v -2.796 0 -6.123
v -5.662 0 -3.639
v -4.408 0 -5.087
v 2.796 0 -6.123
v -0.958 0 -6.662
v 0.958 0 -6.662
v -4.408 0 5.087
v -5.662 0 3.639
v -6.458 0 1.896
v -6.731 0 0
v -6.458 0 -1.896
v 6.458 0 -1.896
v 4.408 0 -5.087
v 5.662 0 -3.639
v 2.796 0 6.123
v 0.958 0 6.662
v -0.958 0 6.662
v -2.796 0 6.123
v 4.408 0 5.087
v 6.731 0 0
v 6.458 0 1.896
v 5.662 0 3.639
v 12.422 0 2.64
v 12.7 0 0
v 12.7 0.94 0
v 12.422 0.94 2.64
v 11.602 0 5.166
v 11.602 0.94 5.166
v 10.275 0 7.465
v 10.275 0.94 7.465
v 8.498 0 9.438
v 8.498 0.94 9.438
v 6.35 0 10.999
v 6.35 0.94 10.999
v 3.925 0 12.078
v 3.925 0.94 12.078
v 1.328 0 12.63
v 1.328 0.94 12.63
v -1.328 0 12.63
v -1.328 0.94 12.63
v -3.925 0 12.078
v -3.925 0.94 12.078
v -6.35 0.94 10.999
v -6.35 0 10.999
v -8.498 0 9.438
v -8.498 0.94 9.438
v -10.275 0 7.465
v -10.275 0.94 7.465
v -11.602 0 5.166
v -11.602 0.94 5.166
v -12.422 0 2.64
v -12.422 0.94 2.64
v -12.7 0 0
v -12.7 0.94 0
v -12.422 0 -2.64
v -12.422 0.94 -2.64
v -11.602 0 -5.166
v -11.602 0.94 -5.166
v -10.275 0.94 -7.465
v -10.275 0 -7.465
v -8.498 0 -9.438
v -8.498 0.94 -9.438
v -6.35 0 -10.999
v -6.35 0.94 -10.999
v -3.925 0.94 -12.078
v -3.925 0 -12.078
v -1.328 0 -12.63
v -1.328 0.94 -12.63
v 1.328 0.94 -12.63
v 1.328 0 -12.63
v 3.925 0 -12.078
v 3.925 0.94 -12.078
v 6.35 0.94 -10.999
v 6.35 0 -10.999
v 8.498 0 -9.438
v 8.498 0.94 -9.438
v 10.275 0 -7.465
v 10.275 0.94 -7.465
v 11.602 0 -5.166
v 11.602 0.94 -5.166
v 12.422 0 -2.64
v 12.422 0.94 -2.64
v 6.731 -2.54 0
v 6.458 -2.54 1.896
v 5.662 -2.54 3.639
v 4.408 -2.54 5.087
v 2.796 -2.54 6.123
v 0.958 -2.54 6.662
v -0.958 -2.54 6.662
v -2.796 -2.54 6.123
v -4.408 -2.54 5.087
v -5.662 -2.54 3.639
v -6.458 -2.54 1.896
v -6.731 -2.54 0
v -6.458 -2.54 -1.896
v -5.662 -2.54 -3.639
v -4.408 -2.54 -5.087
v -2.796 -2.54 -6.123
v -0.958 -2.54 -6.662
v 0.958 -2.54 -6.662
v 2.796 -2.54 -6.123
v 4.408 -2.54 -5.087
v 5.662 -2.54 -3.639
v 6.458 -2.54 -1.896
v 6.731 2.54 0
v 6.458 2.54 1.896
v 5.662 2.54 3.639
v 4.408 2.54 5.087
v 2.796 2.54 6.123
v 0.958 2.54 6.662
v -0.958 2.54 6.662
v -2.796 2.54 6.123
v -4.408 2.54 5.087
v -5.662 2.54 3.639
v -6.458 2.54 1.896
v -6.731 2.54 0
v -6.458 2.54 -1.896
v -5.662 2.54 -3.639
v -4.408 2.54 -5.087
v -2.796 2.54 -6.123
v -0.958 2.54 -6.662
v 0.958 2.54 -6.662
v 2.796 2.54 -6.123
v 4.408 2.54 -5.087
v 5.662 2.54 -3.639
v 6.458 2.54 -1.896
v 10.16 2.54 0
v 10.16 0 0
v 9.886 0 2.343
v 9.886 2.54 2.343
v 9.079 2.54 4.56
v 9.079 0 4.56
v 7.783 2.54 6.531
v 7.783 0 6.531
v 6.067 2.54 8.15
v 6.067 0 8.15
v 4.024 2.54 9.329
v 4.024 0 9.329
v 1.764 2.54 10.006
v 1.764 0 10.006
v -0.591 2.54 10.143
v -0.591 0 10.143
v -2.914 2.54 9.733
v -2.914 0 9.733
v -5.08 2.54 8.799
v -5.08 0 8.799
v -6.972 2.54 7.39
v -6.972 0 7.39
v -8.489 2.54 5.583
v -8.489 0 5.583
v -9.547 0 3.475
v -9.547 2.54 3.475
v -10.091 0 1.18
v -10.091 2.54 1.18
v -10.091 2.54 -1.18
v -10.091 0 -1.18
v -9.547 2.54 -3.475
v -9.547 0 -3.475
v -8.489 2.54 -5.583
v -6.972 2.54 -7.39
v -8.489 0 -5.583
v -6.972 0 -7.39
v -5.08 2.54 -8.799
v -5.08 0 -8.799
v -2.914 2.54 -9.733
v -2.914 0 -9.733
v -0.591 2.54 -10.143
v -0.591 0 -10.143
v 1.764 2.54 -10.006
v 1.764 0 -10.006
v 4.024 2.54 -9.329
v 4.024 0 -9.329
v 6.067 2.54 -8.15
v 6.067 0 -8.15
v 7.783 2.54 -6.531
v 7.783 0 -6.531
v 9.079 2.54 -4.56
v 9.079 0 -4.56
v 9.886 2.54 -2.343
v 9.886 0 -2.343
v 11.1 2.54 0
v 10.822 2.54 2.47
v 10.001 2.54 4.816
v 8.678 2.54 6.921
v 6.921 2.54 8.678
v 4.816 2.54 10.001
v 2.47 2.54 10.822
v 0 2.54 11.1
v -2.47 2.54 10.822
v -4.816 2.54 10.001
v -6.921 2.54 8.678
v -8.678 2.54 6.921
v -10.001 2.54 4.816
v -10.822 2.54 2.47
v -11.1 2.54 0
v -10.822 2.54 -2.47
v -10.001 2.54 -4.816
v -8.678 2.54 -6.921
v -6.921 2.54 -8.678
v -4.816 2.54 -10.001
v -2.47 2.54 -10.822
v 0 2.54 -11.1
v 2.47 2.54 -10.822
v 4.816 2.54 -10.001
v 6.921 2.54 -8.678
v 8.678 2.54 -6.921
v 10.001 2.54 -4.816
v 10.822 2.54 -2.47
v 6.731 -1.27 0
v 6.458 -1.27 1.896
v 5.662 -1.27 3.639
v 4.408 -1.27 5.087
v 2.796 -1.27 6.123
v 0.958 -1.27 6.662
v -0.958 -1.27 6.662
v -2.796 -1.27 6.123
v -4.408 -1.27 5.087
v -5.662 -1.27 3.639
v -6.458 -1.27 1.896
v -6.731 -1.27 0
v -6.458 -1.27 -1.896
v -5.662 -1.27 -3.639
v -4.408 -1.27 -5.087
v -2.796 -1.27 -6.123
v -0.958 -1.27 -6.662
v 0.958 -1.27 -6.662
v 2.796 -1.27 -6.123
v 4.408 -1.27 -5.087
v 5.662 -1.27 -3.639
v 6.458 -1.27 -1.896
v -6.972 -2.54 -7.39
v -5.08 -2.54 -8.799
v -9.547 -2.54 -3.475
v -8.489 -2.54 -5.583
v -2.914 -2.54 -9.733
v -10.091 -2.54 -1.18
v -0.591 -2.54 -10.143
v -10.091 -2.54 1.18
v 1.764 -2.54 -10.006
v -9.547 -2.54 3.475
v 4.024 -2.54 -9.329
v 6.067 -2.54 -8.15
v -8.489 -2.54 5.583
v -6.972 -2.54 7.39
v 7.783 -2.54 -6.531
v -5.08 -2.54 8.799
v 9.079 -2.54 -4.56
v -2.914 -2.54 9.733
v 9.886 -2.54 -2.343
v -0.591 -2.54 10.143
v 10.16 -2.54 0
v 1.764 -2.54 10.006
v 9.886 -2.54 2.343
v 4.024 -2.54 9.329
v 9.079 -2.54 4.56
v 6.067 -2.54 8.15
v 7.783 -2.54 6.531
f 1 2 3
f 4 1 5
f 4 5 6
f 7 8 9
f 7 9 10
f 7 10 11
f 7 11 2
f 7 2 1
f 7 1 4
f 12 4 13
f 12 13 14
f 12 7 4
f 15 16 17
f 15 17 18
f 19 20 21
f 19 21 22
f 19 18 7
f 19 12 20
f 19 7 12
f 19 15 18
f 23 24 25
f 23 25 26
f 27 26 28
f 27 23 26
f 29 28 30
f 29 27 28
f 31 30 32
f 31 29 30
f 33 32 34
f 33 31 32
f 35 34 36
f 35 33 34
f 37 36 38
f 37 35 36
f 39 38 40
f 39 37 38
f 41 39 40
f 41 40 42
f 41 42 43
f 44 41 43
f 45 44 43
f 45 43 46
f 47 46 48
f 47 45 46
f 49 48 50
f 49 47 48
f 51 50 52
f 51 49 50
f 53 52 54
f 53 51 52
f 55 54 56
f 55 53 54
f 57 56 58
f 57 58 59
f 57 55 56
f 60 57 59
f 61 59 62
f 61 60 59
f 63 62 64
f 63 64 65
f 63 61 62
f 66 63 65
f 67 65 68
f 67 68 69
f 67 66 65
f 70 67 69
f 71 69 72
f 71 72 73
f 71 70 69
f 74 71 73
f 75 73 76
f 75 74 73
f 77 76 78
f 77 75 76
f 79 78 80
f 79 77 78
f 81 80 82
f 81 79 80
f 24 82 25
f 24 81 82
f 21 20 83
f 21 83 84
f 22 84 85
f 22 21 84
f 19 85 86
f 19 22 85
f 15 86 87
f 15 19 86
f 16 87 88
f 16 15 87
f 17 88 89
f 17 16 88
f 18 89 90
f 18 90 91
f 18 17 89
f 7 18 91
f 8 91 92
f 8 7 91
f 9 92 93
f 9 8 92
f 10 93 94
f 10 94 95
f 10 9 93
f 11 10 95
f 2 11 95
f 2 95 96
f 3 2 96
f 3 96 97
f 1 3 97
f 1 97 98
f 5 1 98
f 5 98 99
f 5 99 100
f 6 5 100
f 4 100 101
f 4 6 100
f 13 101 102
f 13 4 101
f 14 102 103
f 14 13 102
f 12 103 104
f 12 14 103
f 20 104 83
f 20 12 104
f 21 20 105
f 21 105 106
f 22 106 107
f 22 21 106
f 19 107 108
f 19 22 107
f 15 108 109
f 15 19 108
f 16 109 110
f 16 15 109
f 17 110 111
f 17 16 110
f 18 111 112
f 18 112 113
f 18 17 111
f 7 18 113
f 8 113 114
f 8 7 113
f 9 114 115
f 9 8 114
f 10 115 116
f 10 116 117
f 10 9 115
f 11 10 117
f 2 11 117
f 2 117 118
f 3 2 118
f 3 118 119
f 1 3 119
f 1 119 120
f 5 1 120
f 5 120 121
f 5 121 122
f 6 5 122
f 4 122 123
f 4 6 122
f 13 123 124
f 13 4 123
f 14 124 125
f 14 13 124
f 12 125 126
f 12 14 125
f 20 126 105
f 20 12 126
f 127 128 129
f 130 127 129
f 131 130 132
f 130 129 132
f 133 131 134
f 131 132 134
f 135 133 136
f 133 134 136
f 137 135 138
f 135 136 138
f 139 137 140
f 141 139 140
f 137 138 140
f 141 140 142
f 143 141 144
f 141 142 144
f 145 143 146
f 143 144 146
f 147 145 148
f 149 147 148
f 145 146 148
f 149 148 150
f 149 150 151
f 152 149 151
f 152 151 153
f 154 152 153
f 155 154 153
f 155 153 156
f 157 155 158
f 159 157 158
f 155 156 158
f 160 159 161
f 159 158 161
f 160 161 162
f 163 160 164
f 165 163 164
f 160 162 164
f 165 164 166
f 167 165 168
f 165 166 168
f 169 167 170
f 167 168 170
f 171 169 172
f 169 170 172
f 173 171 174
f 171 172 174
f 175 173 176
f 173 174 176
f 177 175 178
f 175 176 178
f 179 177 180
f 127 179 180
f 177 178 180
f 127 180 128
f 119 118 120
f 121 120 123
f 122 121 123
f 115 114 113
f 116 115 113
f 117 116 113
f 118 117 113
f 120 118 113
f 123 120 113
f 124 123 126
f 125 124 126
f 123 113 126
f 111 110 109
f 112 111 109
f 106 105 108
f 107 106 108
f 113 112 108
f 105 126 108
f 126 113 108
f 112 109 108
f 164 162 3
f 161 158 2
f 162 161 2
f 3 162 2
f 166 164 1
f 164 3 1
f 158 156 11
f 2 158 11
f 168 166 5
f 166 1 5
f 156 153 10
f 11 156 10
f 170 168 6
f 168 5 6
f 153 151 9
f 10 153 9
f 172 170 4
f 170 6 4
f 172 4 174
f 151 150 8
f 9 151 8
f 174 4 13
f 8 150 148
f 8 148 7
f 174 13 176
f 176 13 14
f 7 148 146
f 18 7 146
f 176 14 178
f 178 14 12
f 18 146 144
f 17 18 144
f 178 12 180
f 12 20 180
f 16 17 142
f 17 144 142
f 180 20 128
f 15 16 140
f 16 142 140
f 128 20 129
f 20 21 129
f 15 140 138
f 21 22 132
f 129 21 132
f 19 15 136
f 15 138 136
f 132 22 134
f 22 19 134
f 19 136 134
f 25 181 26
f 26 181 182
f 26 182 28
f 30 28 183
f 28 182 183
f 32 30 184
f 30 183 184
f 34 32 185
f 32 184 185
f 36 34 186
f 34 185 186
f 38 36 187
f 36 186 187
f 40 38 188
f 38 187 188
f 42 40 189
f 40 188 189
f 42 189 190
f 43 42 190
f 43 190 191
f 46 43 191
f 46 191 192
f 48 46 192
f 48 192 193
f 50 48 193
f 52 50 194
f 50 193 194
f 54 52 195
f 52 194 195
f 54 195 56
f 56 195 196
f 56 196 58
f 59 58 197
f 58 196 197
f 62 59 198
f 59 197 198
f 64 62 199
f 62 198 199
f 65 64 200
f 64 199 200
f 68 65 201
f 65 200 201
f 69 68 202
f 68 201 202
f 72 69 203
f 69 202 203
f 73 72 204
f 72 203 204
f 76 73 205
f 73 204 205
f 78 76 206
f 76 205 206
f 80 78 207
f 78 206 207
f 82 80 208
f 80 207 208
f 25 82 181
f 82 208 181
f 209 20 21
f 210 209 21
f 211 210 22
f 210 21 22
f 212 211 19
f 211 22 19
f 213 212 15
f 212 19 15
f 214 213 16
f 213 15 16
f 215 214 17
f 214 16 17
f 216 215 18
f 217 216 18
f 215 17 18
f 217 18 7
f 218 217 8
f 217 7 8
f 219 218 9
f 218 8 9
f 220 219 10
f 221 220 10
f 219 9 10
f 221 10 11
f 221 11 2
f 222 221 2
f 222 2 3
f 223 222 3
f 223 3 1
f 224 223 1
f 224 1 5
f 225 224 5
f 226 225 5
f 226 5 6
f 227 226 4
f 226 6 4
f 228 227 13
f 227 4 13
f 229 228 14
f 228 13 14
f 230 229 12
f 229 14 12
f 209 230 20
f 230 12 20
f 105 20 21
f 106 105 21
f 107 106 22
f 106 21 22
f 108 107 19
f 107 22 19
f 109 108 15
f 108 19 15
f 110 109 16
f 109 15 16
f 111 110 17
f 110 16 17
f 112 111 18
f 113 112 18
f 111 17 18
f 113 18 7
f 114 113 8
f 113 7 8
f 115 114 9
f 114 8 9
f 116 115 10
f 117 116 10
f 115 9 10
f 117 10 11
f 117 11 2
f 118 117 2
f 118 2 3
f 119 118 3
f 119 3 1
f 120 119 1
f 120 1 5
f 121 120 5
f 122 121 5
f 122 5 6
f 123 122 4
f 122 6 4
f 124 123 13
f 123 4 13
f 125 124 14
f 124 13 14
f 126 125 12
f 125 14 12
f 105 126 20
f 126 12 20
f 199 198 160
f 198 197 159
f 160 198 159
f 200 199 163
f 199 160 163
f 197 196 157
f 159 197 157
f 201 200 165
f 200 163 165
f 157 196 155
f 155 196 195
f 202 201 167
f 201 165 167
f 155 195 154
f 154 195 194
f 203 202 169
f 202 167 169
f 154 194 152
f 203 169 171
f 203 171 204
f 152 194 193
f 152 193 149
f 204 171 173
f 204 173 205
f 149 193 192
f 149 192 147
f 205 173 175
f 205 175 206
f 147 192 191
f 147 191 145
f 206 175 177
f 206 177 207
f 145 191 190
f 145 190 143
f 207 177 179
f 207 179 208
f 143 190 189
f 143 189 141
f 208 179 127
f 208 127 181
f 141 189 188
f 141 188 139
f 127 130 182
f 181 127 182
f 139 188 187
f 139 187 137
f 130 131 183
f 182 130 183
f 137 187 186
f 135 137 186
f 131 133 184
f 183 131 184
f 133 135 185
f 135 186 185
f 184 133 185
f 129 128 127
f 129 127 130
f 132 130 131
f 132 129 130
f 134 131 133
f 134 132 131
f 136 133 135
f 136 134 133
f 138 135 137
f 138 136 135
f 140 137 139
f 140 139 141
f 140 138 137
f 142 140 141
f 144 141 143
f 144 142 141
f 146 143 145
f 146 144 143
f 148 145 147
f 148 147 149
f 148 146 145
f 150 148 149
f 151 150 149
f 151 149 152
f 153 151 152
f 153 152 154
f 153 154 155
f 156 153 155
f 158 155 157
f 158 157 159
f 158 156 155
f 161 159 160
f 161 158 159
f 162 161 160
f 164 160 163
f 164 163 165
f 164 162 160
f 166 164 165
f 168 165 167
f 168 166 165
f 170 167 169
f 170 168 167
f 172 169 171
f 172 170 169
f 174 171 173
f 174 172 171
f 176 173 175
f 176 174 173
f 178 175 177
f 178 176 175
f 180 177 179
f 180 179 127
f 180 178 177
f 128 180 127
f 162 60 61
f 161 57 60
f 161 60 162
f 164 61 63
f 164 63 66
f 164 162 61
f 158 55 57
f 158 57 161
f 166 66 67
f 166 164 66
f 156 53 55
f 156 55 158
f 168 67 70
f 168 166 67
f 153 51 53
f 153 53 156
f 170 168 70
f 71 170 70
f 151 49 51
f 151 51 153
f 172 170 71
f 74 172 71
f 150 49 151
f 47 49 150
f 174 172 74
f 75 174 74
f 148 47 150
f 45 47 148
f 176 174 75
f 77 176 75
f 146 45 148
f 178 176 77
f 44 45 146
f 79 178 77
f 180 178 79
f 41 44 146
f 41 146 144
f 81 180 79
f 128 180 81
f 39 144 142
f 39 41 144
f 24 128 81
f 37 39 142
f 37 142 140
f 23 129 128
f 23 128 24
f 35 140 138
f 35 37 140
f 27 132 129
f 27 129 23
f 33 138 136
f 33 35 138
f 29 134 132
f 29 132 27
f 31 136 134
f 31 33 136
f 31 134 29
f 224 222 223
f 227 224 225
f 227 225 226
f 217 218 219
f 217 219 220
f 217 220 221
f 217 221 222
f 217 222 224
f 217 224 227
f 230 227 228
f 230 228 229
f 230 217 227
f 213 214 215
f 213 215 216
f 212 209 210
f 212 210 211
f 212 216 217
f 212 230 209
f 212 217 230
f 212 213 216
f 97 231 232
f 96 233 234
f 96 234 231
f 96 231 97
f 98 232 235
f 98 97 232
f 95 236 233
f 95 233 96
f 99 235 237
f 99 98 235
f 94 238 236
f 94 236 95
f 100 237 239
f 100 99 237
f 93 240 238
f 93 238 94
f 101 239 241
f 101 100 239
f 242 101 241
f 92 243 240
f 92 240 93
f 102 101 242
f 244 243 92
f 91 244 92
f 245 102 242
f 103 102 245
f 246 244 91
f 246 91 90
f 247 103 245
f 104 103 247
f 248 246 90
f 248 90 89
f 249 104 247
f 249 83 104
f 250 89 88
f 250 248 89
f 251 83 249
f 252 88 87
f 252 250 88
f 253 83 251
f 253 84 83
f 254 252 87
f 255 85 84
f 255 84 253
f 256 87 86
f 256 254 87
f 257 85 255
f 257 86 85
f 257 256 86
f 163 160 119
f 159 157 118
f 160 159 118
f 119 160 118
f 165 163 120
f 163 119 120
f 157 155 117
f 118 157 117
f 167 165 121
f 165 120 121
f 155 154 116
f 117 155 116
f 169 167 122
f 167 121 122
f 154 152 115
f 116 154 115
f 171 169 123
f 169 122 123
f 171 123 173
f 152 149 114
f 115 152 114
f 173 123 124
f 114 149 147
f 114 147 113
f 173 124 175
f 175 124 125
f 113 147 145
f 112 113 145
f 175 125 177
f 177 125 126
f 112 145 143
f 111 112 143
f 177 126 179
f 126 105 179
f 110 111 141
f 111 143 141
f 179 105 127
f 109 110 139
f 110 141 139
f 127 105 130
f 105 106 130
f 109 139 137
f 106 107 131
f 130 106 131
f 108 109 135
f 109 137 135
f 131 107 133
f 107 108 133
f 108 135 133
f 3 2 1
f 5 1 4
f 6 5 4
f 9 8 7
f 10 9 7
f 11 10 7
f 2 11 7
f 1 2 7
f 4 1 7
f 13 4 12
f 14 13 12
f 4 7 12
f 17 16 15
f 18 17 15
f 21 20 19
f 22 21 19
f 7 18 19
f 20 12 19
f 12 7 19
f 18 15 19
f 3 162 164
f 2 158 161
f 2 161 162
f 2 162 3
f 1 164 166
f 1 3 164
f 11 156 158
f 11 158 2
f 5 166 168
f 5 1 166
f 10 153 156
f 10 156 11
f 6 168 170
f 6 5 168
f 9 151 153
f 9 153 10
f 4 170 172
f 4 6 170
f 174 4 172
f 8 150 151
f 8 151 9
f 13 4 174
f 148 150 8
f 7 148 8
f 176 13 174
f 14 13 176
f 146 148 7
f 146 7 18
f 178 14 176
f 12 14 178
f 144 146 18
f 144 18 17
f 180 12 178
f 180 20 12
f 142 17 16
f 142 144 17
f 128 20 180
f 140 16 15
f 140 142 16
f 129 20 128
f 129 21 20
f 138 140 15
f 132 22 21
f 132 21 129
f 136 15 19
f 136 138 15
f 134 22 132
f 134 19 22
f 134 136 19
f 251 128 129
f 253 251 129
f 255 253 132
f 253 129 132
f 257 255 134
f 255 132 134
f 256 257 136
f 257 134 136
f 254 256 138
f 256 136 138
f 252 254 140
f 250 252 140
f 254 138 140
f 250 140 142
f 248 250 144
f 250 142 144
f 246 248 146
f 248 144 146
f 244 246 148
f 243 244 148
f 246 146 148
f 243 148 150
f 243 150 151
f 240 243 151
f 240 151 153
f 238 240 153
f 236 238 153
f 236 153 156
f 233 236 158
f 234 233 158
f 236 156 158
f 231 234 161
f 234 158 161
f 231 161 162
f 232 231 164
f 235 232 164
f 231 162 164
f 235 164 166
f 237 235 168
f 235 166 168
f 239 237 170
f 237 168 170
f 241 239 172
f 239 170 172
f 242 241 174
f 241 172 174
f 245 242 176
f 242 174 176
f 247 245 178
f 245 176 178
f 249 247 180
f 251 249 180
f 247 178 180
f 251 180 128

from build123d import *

# Parameters (mm, degrees)
F0_R     = 10.16
F0_R_2   = 6.731
F1_DEPTH = 2.54
F2_DEPTH = 1.27
F0_R_3   = 12.7
F3_DEPTH = 2.54
F4_DEPTH = 2.54
F5_DEPTH = 2.54
F6_SIZE  = 1.6002


with BuildPart() as f1:
    # F0 (on Front) → F1 (new body)
    with BuildSketch(Plane.XZ):
        Circle(F0_R)
        Circle(F0_R_2, mode=Mode.SUBTRACT)
    extrude(amount=F1_DEPTH)


with BuildPart() as f2:
    # F0 (on Front) → F2 (new body)
    with BuildSketch(Plane.XZ):
        Circle(F0_R_2)
    extrude(amount=F2_DEPTH)


with BuildPart() as f3:
    # F0 (on Front) → F3 (new body)
    with BuildSketch(Plane.XZ):
        Circle(F0_R_3)
        Circle(F0_R, mode=Mode.SUBTRACT)
    extrude(amount=-F3_DEPTH)

    # F6
    f6_edges = [f3.edges().sort_by_distance(p)[0] for p in [
        (-12.7, 2.54, 0),
    ]]
    chamfer(f6_edges, length=F6_SIZE)


with BuildPart() as f4:
    # F0 (on Front) → F4 (new body)
    with BuildSketch(Plane.XZ):
        Circle(F0_R)
        Circle(F0_R_2, mode=Mode.SUBTRACT)
    extrude(amount=-F4_DEPTH)


with BuildPart() as f5:
    # F0 (on Front) → F5 (new body)
    with BuildSketch(Plane.XZ):
        Circle(F0_R_2)
    extrude(amount=-F5_DEPTH)


solid = Compound([f1.part, f2.part, f3.part, f4.part, f5.part])
